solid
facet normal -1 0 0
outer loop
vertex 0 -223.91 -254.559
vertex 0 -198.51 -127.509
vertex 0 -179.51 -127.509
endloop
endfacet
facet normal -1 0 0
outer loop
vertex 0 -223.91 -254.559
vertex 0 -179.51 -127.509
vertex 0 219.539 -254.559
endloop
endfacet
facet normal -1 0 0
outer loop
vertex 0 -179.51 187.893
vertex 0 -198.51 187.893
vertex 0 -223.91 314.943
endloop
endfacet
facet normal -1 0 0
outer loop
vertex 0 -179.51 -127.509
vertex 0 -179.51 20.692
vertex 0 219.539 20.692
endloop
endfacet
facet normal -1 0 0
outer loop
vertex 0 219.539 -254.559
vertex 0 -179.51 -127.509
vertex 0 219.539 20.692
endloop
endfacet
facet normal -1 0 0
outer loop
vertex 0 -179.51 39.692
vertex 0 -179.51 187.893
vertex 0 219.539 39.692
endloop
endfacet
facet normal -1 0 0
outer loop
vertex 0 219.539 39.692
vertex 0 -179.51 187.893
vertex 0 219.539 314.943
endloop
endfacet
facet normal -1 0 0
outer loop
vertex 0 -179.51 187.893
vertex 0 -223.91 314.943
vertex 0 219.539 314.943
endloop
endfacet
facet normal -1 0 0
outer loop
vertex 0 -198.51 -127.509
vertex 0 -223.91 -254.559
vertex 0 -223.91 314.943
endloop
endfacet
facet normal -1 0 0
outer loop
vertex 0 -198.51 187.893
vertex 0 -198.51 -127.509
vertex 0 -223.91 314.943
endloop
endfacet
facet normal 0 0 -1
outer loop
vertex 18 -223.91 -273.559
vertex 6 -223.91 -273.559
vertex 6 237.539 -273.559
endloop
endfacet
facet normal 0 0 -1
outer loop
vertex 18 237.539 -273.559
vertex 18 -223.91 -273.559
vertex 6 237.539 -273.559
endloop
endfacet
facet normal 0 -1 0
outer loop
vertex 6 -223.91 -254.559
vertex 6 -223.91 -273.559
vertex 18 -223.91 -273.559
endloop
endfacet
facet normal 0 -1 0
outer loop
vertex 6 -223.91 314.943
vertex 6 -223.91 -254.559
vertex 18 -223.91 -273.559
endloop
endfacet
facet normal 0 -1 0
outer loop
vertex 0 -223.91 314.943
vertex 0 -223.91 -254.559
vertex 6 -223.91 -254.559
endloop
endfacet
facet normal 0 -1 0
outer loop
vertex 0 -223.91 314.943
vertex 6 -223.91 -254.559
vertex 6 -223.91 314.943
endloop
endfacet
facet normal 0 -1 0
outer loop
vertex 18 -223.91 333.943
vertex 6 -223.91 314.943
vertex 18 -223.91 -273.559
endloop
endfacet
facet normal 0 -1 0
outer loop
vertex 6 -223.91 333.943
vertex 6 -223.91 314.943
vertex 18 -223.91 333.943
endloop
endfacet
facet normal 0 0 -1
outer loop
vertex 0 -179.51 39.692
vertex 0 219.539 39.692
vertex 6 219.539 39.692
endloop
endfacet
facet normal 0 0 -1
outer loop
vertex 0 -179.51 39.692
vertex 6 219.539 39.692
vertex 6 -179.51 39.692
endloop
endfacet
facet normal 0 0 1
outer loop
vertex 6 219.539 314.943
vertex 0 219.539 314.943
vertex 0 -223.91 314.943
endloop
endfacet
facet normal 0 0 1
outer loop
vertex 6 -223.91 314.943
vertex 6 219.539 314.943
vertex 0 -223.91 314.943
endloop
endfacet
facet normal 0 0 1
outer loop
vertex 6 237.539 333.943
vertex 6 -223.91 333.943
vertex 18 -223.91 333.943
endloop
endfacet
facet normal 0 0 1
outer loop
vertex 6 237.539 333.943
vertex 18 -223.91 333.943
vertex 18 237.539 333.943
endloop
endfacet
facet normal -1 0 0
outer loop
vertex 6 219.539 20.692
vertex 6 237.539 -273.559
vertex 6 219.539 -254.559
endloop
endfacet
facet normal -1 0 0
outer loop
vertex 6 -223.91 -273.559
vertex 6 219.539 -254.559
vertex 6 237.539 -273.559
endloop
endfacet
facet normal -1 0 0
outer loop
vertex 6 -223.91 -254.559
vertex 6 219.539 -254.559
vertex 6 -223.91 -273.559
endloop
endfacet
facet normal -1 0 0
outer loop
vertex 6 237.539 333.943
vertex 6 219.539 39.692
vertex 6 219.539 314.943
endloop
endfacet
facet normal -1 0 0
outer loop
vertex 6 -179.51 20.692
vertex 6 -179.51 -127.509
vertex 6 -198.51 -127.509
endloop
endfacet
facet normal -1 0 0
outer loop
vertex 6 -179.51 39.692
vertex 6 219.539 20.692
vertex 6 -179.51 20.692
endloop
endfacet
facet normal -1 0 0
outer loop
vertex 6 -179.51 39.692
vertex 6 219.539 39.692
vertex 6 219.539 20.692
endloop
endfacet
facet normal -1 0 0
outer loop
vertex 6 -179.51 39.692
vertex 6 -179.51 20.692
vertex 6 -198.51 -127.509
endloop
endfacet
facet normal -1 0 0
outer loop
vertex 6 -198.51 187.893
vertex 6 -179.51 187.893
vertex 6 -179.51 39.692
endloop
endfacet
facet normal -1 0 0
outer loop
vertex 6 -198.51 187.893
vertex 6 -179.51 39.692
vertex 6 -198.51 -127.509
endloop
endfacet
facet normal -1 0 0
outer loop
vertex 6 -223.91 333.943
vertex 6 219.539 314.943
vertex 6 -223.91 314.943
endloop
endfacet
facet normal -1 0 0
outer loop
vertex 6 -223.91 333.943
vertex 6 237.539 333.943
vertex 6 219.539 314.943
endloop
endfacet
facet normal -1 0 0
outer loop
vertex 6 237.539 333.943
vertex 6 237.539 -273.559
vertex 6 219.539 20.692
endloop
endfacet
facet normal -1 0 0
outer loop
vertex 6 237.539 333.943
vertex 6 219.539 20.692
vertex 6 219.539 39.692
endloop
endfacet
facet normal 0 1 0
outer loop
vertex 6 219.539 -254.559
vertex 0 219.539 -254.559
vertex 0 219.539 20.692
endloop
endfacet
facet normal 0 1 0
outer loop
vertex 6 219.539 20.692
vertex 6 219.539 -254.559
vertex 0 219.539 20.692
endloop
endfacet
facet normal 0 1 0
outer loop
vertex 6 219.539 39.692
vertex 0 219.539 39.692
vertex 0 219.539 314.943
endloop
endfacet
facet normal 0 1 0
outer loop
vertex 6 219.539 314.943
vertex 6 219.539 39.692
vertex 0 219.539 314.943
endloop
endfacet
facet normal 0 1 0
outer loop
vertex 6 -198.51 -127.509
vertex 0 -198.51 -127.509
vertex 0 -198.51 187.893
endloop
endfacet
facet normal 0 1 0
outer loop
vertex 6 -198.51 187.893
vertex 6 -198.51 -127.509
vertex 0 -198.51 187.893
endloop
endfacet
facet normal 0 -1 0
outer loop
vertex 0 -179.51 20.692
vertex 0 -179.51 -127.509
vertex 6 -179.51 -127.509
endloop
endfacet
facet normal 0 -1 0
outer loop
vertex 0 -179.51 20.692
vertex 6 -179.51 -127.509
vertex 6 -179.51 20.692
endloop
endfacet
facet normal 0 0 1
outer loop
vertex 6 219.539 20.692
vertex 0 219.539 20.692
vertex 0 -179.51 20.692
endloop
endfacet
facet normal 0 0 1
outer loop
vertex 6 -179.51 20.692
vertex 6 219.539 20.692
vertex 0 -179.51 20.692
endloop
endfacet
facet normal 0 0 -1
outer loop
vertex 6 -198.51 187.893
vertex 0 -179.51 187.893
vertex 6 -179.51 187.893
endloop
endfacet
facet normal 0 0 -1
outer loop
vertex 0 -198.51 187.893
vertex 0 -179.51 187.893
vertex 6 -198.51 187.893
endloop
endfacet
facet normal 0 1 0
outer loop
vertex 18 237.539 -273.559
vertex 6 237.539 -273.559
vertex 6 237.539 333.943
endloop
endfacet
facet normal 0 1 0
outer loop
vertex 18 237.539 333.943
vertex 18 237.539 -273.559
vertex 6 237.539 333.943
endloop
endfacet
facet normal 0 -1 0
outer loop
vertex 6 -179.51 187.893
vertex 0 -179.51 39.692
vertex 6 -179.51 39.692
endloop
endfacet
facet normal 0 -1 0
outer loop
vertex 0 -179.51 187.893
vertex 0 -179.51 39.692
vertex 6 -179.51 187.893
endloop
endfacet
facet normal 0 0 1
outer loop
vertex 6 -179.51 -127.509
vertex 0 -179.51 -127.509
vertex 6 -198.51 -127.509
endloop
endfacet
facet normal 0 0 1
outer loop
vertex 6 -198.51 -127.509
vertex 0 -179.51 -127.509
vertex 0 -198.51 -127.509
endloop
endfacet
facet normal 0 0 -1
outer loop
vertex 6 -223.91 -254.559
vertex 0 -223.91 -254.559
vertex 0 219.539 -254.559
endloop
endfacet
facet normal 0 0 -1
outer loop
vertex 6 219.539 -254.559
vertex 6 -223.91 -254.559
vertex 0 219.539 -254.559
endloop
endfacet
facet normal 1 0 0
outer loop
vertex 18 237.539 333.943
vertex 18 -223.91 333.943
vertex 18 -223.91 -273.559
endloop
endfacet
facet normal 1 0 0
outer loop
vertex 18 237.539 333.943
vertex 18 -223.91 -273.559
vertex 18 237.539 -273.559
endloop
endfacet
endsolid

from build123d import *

# Parameters (mm, degrees)
F0_W     = 461.44942
F0_H     = 607.50196
F1_DEPTH = 18
F2_W     = 18
F2_H     = 19
F2_H_2   = 569.50196
F2_W_2   = 19
F2_H_3   = 315.40196
F3_DEPTH = 6
F4_W     = 416.292534
F4_H     = 19
F5_DEPTH = 6


with BuildPart() as f1:
    # F0 (on Right) → F1 (new body)
    with BuildSketch(Plane.YZ):
        with Locations((6.814488, 30.1922)):
            Rectangle(F0_W, F0_H)
    extrude(amount=F1_DEPTH)

    # F2 (on face) → F3 (cut)
    with BuildSketch(Plane(origin=(0, 0, 0), x_dir=(0, -1, 0), z_dir=(-1, 0, 0))):
        with Locations((-228.539198, 324.44318)):
            Rectangle(F2_W, F2_H)
        Polygon((180.510222, 333.94318), (-219.539198, 333.94318), (-219.539198, 314.94318), (223.910222, 314.94318), (223.910222, 333.94318), (198.510222, 333.94318), align=None)
        with Locations((-228.539198, 30.1922)):
            Rectangle(F2_W, F2_H_2)
        with Locations((-228.539198, -264.05878)):
            Rectangle(F2_W, F2_H)
        Polygon((223.910222, -254.55878), (-219.539198, -254.55878), (-219.539198, -273.55878), (180.510222, -273.55878), (198.510222, -273.55878), (223.910222, -273.55878), align=None)
        with Locations((189.010222, 30.1922)):
            Rectangle(F2_W_2, F2_H_3)
    extrude(amount=-F3_DEPTH, mode=Mode.SUBTRACT)

    # F4 (on face) → F5 (cut)
    with BuildSketch(Plane(origin=(0, 0, 0), x_dir=(0, -1, 0), z_dir=(-1, 0, 0))):
        with Locations((-18.287234, 30.1922)):
            Rectangle(F4_W, F4_H)
    extrude(amount=-F5_DEPTH, mode=Mode.SUBTRACT)


solid = f1.part
